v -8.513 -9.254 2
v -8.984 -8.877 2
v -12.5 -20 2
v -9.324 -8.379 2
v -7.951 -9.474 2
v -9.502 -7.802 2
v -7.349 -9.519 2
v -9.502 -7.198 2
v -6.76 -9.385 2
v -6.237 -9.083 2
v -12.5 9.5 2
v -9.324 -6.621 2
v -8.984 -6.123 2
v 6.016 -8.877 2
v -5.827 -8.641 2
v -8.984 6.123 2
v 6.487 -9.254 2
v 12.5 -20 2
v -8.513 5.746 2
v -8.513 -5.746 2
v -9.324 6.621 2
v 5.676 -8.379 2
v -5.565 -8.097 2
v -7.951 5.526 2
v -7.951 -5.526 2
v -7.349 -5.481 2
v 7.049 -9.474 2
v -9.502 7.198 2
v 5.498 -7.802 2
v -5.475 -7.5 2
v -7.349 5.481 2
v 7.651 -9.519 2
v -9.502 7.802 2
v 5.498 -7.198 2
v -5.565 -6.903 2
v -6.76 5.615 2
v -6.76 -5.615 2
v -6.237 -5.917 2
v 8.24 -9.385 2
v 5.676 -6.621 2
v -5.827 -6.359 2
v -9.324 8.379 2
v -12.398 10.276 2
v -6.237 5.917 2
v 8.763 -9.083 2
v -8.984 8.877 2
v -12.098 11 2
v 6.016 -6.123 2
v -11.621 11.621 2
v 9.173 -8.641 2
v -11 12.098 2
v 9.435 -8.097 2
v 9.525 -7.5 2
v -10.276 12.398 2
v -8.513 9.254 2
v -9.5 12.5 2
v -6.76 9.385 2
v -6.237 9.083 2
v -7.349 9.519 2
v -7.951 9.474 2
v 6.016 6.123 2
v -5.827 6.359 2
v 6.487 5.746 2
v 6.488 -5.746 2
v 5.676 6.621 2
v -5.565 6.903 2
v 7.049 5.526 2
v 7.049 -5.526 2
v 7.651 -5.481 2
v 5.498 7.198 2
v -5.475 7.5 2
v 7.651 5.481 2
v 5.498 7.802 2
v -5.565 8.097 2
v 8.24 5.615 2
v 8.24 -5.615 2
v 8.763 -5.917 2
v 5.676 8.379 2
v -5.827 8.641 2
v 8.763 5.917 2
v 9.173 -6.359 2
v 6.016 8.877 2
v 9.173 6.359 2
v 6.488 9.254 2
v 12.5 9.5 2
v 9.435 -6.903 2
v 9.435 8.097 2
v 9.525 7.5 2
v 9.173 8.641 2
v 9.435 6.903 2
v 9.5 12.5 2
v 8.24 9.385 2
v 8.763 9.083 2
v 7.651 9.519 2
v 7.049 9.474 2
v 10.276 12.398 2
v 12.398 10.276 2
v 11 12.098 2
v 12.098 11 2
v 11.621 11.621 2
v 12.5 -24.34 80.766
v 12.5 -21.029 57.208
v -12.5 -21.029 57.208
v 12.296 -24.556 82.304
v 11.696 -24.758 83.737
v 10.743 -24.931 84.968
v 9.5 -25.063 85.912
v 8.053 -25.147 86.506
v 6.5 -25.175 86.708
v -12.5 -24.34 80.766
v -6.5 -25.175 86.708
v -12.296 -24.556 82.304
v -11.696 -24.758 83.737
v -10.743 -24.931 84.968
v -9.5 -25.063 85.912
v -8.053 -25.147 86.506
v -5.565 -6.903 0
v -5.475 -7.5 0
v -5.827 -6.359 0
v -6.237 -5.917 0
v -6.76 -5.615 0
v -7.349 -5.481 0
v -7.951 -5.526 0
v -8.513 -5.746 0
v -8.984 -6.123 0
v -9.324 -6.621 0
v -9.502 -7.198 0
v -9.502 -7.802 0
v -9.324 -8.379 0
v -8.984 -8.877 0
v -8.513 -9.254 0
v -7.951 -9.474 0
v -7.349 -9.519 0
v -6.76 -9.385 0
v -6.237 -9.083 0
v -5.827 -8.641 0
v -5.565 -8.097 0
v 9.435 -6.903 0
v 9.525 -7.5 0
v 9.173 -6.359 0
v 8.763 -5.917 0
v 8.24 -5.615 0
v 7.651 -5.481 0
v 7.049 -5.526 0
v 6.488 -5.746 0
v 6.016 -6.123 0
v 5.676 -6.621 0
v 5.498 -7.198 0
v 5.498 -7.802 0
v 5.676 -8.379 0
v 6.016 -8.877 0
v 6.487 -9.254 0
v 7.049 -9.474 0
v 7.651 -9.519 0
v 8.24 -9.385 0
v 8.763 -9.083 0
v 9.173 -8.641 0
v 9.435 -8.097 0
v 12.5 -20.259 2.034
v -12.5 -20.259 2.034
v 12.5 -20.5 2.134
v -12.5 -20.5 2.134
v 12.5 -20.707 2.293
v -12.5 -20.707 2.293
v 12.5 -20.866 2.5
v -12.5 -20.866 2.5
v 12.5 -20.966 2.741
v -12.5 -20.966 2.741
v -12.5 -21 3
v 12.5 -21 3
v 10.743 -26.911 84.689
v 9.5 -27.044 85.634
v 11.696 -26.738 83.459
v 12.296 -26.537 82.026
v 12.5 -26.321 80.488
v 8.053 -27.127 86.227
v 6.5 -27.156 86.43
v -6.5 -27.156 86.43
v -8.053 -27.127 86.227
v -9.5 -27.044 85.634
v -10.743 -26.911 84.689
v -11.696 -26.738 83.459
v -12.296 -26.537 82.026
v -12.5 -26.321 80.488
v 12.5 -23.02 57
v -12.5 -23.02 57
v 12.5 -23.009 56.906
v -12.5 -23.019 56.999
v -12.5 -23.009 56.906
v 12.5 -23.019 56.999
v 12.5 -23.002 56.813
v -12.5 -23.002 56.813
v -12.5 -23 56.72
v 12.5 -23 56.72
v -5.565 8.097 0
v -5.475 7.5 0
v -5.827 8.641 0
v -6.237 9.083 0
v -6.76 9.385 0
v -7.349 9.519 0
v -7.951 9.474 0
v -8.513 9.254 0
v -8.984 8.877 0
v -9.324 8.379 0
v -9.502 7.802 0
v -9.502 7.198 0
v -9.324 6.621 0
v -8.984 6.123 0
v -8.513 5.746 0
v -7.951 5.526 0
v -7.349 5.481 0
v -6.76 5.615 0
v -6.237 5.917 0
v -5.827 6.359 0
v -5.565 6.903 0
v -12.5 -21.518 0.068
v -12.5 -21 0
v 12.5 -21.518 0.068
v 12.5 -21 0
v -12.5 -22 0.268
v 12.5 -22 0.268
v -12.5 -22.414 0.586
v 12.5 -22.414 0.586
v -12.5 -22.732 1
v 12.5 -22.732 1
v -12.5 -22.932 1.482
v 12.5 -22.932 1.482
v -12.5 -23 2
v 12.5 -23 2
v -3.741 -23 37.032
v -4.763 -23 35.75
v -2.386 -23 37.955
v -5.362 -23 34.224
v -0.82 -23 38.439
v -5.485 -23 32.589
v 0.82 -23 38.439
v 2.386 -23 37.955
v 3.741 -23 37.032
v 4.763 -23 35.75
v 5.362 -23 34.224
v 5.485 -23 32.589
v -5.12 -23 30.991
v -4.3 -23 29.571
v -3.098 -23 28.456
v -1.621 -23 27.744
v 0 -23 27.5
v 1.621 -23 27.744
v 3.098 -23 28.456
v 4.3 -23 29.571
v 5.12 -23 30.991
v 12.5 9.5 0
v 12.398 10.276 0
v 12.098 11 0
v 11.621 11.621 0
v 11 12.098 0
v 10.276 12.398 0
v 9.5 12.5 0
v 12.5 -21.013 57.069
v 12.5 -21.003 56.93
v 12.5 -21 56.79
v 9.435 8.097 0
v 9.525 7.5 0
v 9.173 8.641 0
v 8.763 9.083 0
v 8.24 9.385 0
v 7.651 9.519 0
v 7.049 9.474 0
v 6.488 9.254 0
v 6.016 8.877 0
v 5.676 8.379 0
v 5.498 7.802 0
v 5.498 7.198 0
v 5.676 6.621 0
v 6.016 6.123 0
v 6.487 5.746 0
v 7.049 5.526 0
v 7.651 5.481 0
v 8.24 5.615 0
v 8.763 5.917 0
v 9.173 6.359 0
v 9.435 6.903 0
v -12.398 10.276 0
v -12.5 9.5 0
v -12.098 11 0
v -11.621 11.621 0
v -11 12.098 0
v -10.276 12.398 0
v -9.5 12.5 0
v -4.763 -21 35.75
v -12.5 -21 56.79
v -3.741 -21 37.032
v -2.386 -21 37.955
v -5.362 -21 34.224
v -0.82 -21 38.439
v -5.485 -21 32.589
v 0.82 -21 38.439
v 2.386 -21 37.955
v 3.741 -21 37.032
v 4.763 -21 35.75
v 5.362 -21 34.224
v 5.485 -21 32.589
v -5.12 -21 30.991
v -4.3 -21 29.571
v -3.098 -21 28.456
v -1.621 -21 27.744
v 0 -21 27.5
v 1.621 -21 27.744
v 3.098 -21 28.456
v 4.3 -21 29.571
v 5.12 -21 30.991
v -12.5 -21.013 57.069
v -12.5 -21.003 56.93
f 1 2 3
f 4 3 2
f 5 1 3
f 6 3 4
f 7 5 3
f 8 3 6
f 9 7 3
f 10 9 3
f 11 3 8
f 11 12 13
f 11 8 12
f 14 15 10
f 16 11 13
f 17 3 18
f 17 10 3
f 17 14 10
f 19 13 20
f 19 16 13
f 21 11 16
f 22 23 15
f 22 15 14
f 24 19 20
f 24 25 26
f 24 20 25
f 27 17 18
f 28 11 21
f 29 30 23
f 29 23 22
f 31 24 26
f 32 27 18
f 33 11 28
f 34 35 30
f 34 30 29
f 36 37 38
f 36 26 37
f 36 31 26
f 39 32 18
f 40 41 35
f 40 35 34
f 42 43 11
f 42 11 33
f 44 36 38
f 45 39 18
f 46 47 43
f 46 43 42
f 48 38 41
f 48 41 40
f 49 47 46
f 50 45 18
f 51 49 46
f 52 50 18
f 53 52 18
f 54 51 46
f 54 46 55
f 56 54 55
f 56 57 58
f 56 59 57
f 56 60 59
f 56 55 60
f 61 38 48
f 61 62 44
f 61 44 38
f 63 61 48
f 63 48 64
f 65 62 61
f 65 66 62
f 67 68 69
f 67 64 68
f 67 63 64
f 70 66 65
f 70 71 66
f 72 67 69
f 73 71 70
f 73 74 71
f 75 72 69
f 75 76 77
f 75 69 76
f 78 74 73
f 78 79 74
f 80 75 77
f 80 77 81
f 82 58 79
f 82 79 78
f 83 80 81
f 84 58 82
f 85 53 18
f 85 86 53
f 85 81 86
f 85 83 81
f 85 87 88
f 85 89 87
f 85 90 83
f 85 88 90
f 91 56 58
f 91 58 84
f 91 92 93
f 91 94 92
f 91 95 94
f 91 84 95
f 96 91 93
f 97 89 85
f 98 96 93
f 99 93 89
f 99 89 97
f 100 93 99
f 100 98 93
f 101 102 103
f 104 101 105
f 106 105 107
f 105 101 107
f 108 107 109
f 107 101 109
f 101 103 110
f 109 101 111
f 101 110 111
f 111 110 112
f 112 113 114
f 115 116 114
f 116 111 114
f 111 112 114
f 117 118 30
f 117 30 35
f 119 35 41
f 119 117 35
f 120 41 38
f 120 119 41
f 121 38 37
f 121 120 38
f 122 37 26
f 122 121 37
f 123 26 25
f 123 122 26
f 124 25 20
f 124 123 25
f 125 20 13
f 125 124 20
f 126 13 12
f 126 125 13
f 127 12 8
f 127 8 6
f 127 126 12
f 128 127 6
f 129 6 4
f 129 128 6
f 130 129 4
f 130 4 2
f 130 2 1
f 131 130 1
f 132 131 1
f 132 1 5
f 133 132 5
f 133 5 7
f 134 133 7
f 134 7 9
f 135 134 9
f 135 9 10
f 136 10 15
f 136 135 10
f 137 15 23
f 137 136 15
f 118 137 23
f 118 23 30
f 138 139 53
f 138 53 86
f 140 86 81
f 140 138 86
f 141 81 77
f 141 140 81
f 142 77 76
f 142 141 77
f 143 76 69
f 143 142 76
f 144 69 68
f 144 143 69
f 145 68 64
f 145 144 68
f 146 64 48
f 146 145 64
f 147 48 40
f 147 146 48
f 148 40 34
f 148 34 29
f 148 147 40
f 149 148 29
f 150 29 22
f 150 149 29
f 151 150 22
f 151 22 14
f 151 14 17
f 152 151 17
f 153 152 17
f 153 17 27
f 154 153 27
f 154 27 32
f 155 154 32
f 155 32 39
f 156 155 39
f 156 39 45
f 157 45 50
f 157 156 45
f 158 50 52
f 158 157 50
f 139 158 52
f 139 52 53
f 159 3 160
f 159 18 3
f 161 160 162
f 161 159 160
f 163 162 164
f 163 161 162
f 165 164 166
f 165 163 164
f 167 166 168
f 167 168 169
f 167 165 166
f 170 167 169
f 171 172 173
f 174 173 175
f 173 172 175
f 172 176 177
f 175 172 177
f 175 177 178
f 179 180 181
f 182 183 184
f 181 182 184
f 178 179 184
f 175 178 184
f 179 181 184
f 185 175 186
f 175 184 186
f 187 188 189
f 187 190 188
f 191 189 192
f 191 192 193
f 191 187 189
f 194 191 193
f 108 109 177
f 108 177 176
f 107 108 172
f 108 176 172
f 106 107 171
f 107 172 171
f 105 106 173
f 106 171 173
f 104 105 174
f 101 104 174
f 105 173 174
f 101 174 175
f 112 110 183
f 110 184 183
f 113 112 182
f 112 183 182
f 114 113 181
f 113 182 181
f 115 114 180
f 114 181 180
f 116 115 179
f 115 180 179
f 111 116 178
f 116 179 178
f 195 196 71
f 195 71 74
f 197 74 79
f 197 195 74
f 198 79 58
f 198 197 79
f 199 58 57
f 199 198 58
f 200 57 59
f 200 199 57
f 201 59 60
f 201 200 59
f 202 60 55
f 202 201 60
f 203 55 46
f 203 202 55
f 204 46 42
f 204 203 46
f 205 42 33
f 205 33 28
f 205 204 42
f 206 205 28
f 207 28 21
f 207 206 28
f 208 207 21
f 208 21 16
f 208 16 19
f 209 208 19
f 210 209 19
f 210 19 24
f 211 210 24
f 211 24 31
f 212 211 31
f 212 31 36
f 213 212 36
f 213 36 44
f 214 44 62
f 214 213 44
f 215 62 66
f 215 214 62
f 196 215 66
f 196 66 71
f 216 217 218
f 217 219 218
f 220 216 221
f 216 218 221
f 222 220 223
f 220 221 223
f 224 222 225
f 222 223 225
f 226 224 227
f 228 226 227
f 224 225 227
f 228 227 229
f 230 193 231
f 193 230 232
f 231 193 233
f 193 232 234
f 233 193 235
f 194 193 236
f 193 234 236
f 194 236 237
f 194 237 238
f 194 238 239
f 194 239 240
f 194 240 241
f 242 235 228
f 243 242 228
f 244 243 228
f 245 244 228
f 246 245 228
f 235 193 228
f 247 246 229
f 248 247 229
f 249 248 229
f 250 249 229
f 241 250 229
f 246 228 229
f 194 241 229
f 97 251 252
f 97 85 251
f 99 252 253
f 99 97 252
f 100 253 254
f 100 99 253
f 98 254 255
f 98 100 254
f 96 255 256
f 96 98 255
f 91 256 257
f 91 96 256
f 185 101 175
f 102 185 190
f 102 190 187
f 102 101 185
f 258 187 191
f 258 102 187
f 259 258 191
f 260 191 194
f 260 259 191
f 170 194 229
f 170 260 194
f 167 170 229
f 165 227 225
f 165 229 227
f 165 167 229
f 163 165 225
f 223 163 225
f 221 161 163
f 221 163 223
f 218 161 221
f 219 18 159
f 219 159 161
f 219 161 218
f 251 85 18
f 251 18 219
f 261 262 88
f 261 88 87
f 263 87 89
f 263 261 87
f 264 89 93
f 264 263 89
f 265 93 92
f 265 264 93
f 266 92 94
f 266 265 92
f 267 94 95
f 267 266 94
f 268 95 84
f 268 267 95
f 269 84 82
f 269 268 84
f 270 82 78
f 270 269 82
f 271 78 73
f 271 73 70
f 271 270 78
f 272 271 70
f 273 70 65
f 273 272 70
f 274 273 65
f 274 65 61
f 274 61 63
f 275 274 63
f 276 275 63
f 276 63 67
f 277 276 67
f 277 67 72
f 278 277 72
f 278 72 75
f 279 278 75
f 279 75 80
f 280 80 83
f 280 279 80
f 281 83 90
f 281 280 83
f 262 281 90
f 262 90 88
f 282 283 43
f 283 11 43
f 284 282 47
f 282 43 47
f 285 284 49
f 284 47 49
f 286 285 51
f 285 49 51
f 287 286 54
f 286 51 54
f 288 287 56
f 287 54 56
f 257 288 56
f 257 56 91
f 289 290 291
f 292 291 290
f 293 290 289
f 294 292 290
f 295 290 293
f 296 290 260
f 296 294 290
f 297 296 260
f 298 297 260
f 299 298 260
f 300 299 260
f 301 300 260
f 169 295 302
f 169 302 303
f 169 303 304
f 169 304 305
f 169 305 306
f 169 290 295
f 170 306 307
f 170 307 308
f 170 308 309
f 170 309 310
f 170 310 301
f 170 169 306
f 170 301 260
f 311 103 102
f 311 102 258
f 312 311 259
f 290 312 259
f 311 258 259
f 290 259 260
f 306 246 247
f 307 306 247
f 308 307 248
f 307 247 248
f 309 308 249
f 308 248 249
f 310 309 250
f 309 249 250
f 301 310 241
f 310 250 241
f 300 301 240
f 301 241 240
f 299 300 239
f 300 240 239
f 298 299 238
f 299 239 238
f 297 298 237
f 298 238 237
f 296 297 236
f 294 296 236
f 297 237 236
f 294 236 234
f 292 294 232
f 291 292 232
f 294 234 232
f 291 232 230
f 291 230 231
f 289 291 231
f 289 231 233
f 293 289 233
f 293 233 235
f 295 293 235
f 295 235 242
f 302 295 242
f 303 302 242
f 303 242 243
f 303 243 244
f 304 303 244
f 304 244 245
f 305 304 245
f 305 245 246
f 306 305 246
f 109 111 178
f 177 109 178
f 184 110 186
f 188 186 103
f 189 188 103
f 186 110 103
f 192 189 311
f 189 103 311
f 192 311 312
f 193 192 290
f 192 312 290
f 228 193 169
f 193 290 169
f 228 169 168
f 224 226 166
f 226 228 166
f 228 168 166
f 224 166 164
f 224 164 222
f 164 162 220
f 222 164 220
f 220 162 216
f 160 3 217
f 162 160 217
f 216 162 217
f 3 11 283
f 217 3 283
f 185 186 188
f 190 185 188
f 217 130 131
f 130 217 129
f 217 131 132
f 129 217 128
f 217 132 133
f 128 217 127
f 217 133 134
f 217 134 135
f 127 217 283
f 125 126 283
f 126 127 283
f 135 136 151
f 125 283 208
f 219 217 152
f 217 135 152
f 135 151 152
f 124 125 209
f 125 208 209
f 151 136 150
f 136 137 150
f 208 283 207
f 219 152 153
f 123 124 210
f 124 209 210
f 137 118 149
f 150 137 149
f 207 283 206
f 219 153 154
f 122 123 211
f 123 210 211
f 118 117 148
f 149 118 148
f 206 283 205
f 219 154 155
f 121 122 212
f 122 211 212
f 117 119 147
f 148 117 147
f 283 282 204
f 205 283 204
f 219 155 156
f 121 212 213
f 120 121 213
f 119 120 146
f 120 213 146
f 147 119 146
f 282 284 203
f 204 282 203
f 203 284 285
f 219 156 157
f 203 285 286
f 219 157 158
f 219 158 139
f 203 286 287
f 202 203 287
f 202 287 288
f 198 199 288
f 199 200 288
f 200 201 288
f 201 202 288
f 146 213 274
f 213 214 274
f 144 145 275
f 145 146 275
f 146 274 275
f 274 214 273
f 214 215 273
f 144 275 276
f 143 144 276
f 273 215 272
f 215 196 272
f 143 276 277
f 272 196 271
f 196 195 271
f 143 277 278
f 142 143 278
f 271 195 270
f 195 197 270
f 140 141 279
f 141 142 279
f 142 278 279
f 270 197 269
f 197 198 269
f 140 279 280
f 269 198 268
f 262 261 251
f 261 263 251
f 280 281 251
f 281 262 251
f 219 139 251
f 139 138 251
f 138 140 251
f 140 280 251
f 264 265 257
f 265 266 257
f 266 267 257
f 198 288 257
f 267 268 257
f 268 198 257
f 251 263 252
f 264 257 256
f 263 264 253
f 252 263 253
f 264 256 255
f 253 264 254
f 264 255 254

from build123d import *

# Parameters (mm, degrees)
SKETCH1_W           = 25
SKETCH1_H           = 25
SKETCH1_R           = 2.025
BOSS_EXTRUDE1_DEPTH = 2
SKETCH2_W           = 25
SKETCH2_H           = 2
BOSS_EXTRUDE2_DEPTH = 10.5
SKETCH3_W           = 25
SKETCH3_H           = 2
BOSS_EXTRUDE3_DEPTH = 55
FILLET1_R           = 3
FILLET2_R           = 2
FILLET3_R           = 1
BOSS_EXTRUDE4_DEPTH = 25
FILLET4_R           = 3
FILLET5_R           = 2
SKETCH6_R           = 5.5
CUT_EXTRUDE1_DEPTH  = 95.523989327
FILLET6_R           = 6


with BuildPart() as part:
    # Sketch1 → Boss-Extrude1 (new body)
    with BuildSketch(Plane.XY):
        Rectangle(SKETCH1_W, SKETCH1_H)
        with Locations((-7.5, 7.5)):
            Circle(SKETCH1_R, mode=Mode.SUBTRACT)
        with Locations((7.5, 7.5)):
            Circle(SKETCH1_R, mode=Mode.SUBTRACT)
        with Locations((7.5, -7.5)):
            Circle(SKETCH1_R, mode=Mode.SUBTRACT)
        with Locations((-7.5, -7.5)):
            Circle(SKETCH1_R, mode=Mode.SUBTRACT)
    extrude(amount=BOSS_EXTRUDE1_DEPTH)

    # Sketch2 → Boss-Extrude2 (add)
    with BuildSketch(Plane.XZ.offset(12.5)):
        with Locations((0, 1)):
            Rectangle(SKETCH2_W, SKETCH2_H)
    extrude(amount=BOSS_EXTRUDE2_DEPTH)

    # Sketch3 → Boss-Extrude3 (add)
    with BuildSketch(Plane.XY.offset(2)):
        with Locations((0, -22)):
            Rectangle(SKETCH3_W, SKETCH3_H)
    extrude(amount=BOSS_EXTRUDE3_DEPTH)

    # Fillet1
    fillet1_edges = [part.edges().sort_by_distance(p)[0] for p in [
        (-12.5, 12.5, 1),
        (12.5, 12.5, 1),
    ]]
    fillet(fillet1_edges, radius=FILLET1_R)

    # Fillet2
    fillet2_edges = [part.edges().sort_by_distance(p)[0] for p in [
        (0, -23, 0),
    ]]
    fillet(fillet2_edges, radius=FILLET2_R)

    # Fillet3
    fillet3_edges = [part.edges().sort_by_distance(p)[0] for p in [
        (0, -21, 2),
    ]]
    fillet(fillet3_edges, radius=FILLET3_R)

    # Sketch5 → Boss-Extrude4 (add)
    with BuildSketch(Plane.ZY.offset(12.5)):
        Polygon((57, -21), (86.708042062, -25.175193029), (86.42969586, -27.155729166), (57, -23.019655145), (56.721653798, -22.980536137), align=None)
    extrude(amount=-BOSS_EXTRUDE4_DEPTH)

    # Fillet4
    fillet4_edges = [part.edges().sort_by_distance(p)[0] for p in [
        (0, -21, 57),
    ]]
    fillet(fillet4_edges, radius=FILLET4_R)

    # Fillet5
    fillet5_edges = [part.edges().sort_by_distance(p)[0] for p in [
        (0, -23, 56.860146376),
    ]]
    fillet(fillet5_edges, radius=FILLET5_R)

    # Sketch6 → Cut-Extrude1 (cut, through all)
    with BuildSketch(Plane.XZ.offset(23)):
        with Locations(Location((0, 33, 0), (0, 0, 270))):
            Circle(SKETCH6_R)
    extrude(amount=-CUT_EXTRUDE1_DEPTH, mode=Mode.SUBTRACT)

    # Fillet6
    fillet6_edges = [part.edges().sort_by_distance(p)[0] for p in [
        (12.5, -26.165461098, 86.568868961),
        (-12.5, -26.165461098, 86.568868961),
    ]]
    fillet(fillet6_edges, radius=FILLET6_R)


solid = part.part
